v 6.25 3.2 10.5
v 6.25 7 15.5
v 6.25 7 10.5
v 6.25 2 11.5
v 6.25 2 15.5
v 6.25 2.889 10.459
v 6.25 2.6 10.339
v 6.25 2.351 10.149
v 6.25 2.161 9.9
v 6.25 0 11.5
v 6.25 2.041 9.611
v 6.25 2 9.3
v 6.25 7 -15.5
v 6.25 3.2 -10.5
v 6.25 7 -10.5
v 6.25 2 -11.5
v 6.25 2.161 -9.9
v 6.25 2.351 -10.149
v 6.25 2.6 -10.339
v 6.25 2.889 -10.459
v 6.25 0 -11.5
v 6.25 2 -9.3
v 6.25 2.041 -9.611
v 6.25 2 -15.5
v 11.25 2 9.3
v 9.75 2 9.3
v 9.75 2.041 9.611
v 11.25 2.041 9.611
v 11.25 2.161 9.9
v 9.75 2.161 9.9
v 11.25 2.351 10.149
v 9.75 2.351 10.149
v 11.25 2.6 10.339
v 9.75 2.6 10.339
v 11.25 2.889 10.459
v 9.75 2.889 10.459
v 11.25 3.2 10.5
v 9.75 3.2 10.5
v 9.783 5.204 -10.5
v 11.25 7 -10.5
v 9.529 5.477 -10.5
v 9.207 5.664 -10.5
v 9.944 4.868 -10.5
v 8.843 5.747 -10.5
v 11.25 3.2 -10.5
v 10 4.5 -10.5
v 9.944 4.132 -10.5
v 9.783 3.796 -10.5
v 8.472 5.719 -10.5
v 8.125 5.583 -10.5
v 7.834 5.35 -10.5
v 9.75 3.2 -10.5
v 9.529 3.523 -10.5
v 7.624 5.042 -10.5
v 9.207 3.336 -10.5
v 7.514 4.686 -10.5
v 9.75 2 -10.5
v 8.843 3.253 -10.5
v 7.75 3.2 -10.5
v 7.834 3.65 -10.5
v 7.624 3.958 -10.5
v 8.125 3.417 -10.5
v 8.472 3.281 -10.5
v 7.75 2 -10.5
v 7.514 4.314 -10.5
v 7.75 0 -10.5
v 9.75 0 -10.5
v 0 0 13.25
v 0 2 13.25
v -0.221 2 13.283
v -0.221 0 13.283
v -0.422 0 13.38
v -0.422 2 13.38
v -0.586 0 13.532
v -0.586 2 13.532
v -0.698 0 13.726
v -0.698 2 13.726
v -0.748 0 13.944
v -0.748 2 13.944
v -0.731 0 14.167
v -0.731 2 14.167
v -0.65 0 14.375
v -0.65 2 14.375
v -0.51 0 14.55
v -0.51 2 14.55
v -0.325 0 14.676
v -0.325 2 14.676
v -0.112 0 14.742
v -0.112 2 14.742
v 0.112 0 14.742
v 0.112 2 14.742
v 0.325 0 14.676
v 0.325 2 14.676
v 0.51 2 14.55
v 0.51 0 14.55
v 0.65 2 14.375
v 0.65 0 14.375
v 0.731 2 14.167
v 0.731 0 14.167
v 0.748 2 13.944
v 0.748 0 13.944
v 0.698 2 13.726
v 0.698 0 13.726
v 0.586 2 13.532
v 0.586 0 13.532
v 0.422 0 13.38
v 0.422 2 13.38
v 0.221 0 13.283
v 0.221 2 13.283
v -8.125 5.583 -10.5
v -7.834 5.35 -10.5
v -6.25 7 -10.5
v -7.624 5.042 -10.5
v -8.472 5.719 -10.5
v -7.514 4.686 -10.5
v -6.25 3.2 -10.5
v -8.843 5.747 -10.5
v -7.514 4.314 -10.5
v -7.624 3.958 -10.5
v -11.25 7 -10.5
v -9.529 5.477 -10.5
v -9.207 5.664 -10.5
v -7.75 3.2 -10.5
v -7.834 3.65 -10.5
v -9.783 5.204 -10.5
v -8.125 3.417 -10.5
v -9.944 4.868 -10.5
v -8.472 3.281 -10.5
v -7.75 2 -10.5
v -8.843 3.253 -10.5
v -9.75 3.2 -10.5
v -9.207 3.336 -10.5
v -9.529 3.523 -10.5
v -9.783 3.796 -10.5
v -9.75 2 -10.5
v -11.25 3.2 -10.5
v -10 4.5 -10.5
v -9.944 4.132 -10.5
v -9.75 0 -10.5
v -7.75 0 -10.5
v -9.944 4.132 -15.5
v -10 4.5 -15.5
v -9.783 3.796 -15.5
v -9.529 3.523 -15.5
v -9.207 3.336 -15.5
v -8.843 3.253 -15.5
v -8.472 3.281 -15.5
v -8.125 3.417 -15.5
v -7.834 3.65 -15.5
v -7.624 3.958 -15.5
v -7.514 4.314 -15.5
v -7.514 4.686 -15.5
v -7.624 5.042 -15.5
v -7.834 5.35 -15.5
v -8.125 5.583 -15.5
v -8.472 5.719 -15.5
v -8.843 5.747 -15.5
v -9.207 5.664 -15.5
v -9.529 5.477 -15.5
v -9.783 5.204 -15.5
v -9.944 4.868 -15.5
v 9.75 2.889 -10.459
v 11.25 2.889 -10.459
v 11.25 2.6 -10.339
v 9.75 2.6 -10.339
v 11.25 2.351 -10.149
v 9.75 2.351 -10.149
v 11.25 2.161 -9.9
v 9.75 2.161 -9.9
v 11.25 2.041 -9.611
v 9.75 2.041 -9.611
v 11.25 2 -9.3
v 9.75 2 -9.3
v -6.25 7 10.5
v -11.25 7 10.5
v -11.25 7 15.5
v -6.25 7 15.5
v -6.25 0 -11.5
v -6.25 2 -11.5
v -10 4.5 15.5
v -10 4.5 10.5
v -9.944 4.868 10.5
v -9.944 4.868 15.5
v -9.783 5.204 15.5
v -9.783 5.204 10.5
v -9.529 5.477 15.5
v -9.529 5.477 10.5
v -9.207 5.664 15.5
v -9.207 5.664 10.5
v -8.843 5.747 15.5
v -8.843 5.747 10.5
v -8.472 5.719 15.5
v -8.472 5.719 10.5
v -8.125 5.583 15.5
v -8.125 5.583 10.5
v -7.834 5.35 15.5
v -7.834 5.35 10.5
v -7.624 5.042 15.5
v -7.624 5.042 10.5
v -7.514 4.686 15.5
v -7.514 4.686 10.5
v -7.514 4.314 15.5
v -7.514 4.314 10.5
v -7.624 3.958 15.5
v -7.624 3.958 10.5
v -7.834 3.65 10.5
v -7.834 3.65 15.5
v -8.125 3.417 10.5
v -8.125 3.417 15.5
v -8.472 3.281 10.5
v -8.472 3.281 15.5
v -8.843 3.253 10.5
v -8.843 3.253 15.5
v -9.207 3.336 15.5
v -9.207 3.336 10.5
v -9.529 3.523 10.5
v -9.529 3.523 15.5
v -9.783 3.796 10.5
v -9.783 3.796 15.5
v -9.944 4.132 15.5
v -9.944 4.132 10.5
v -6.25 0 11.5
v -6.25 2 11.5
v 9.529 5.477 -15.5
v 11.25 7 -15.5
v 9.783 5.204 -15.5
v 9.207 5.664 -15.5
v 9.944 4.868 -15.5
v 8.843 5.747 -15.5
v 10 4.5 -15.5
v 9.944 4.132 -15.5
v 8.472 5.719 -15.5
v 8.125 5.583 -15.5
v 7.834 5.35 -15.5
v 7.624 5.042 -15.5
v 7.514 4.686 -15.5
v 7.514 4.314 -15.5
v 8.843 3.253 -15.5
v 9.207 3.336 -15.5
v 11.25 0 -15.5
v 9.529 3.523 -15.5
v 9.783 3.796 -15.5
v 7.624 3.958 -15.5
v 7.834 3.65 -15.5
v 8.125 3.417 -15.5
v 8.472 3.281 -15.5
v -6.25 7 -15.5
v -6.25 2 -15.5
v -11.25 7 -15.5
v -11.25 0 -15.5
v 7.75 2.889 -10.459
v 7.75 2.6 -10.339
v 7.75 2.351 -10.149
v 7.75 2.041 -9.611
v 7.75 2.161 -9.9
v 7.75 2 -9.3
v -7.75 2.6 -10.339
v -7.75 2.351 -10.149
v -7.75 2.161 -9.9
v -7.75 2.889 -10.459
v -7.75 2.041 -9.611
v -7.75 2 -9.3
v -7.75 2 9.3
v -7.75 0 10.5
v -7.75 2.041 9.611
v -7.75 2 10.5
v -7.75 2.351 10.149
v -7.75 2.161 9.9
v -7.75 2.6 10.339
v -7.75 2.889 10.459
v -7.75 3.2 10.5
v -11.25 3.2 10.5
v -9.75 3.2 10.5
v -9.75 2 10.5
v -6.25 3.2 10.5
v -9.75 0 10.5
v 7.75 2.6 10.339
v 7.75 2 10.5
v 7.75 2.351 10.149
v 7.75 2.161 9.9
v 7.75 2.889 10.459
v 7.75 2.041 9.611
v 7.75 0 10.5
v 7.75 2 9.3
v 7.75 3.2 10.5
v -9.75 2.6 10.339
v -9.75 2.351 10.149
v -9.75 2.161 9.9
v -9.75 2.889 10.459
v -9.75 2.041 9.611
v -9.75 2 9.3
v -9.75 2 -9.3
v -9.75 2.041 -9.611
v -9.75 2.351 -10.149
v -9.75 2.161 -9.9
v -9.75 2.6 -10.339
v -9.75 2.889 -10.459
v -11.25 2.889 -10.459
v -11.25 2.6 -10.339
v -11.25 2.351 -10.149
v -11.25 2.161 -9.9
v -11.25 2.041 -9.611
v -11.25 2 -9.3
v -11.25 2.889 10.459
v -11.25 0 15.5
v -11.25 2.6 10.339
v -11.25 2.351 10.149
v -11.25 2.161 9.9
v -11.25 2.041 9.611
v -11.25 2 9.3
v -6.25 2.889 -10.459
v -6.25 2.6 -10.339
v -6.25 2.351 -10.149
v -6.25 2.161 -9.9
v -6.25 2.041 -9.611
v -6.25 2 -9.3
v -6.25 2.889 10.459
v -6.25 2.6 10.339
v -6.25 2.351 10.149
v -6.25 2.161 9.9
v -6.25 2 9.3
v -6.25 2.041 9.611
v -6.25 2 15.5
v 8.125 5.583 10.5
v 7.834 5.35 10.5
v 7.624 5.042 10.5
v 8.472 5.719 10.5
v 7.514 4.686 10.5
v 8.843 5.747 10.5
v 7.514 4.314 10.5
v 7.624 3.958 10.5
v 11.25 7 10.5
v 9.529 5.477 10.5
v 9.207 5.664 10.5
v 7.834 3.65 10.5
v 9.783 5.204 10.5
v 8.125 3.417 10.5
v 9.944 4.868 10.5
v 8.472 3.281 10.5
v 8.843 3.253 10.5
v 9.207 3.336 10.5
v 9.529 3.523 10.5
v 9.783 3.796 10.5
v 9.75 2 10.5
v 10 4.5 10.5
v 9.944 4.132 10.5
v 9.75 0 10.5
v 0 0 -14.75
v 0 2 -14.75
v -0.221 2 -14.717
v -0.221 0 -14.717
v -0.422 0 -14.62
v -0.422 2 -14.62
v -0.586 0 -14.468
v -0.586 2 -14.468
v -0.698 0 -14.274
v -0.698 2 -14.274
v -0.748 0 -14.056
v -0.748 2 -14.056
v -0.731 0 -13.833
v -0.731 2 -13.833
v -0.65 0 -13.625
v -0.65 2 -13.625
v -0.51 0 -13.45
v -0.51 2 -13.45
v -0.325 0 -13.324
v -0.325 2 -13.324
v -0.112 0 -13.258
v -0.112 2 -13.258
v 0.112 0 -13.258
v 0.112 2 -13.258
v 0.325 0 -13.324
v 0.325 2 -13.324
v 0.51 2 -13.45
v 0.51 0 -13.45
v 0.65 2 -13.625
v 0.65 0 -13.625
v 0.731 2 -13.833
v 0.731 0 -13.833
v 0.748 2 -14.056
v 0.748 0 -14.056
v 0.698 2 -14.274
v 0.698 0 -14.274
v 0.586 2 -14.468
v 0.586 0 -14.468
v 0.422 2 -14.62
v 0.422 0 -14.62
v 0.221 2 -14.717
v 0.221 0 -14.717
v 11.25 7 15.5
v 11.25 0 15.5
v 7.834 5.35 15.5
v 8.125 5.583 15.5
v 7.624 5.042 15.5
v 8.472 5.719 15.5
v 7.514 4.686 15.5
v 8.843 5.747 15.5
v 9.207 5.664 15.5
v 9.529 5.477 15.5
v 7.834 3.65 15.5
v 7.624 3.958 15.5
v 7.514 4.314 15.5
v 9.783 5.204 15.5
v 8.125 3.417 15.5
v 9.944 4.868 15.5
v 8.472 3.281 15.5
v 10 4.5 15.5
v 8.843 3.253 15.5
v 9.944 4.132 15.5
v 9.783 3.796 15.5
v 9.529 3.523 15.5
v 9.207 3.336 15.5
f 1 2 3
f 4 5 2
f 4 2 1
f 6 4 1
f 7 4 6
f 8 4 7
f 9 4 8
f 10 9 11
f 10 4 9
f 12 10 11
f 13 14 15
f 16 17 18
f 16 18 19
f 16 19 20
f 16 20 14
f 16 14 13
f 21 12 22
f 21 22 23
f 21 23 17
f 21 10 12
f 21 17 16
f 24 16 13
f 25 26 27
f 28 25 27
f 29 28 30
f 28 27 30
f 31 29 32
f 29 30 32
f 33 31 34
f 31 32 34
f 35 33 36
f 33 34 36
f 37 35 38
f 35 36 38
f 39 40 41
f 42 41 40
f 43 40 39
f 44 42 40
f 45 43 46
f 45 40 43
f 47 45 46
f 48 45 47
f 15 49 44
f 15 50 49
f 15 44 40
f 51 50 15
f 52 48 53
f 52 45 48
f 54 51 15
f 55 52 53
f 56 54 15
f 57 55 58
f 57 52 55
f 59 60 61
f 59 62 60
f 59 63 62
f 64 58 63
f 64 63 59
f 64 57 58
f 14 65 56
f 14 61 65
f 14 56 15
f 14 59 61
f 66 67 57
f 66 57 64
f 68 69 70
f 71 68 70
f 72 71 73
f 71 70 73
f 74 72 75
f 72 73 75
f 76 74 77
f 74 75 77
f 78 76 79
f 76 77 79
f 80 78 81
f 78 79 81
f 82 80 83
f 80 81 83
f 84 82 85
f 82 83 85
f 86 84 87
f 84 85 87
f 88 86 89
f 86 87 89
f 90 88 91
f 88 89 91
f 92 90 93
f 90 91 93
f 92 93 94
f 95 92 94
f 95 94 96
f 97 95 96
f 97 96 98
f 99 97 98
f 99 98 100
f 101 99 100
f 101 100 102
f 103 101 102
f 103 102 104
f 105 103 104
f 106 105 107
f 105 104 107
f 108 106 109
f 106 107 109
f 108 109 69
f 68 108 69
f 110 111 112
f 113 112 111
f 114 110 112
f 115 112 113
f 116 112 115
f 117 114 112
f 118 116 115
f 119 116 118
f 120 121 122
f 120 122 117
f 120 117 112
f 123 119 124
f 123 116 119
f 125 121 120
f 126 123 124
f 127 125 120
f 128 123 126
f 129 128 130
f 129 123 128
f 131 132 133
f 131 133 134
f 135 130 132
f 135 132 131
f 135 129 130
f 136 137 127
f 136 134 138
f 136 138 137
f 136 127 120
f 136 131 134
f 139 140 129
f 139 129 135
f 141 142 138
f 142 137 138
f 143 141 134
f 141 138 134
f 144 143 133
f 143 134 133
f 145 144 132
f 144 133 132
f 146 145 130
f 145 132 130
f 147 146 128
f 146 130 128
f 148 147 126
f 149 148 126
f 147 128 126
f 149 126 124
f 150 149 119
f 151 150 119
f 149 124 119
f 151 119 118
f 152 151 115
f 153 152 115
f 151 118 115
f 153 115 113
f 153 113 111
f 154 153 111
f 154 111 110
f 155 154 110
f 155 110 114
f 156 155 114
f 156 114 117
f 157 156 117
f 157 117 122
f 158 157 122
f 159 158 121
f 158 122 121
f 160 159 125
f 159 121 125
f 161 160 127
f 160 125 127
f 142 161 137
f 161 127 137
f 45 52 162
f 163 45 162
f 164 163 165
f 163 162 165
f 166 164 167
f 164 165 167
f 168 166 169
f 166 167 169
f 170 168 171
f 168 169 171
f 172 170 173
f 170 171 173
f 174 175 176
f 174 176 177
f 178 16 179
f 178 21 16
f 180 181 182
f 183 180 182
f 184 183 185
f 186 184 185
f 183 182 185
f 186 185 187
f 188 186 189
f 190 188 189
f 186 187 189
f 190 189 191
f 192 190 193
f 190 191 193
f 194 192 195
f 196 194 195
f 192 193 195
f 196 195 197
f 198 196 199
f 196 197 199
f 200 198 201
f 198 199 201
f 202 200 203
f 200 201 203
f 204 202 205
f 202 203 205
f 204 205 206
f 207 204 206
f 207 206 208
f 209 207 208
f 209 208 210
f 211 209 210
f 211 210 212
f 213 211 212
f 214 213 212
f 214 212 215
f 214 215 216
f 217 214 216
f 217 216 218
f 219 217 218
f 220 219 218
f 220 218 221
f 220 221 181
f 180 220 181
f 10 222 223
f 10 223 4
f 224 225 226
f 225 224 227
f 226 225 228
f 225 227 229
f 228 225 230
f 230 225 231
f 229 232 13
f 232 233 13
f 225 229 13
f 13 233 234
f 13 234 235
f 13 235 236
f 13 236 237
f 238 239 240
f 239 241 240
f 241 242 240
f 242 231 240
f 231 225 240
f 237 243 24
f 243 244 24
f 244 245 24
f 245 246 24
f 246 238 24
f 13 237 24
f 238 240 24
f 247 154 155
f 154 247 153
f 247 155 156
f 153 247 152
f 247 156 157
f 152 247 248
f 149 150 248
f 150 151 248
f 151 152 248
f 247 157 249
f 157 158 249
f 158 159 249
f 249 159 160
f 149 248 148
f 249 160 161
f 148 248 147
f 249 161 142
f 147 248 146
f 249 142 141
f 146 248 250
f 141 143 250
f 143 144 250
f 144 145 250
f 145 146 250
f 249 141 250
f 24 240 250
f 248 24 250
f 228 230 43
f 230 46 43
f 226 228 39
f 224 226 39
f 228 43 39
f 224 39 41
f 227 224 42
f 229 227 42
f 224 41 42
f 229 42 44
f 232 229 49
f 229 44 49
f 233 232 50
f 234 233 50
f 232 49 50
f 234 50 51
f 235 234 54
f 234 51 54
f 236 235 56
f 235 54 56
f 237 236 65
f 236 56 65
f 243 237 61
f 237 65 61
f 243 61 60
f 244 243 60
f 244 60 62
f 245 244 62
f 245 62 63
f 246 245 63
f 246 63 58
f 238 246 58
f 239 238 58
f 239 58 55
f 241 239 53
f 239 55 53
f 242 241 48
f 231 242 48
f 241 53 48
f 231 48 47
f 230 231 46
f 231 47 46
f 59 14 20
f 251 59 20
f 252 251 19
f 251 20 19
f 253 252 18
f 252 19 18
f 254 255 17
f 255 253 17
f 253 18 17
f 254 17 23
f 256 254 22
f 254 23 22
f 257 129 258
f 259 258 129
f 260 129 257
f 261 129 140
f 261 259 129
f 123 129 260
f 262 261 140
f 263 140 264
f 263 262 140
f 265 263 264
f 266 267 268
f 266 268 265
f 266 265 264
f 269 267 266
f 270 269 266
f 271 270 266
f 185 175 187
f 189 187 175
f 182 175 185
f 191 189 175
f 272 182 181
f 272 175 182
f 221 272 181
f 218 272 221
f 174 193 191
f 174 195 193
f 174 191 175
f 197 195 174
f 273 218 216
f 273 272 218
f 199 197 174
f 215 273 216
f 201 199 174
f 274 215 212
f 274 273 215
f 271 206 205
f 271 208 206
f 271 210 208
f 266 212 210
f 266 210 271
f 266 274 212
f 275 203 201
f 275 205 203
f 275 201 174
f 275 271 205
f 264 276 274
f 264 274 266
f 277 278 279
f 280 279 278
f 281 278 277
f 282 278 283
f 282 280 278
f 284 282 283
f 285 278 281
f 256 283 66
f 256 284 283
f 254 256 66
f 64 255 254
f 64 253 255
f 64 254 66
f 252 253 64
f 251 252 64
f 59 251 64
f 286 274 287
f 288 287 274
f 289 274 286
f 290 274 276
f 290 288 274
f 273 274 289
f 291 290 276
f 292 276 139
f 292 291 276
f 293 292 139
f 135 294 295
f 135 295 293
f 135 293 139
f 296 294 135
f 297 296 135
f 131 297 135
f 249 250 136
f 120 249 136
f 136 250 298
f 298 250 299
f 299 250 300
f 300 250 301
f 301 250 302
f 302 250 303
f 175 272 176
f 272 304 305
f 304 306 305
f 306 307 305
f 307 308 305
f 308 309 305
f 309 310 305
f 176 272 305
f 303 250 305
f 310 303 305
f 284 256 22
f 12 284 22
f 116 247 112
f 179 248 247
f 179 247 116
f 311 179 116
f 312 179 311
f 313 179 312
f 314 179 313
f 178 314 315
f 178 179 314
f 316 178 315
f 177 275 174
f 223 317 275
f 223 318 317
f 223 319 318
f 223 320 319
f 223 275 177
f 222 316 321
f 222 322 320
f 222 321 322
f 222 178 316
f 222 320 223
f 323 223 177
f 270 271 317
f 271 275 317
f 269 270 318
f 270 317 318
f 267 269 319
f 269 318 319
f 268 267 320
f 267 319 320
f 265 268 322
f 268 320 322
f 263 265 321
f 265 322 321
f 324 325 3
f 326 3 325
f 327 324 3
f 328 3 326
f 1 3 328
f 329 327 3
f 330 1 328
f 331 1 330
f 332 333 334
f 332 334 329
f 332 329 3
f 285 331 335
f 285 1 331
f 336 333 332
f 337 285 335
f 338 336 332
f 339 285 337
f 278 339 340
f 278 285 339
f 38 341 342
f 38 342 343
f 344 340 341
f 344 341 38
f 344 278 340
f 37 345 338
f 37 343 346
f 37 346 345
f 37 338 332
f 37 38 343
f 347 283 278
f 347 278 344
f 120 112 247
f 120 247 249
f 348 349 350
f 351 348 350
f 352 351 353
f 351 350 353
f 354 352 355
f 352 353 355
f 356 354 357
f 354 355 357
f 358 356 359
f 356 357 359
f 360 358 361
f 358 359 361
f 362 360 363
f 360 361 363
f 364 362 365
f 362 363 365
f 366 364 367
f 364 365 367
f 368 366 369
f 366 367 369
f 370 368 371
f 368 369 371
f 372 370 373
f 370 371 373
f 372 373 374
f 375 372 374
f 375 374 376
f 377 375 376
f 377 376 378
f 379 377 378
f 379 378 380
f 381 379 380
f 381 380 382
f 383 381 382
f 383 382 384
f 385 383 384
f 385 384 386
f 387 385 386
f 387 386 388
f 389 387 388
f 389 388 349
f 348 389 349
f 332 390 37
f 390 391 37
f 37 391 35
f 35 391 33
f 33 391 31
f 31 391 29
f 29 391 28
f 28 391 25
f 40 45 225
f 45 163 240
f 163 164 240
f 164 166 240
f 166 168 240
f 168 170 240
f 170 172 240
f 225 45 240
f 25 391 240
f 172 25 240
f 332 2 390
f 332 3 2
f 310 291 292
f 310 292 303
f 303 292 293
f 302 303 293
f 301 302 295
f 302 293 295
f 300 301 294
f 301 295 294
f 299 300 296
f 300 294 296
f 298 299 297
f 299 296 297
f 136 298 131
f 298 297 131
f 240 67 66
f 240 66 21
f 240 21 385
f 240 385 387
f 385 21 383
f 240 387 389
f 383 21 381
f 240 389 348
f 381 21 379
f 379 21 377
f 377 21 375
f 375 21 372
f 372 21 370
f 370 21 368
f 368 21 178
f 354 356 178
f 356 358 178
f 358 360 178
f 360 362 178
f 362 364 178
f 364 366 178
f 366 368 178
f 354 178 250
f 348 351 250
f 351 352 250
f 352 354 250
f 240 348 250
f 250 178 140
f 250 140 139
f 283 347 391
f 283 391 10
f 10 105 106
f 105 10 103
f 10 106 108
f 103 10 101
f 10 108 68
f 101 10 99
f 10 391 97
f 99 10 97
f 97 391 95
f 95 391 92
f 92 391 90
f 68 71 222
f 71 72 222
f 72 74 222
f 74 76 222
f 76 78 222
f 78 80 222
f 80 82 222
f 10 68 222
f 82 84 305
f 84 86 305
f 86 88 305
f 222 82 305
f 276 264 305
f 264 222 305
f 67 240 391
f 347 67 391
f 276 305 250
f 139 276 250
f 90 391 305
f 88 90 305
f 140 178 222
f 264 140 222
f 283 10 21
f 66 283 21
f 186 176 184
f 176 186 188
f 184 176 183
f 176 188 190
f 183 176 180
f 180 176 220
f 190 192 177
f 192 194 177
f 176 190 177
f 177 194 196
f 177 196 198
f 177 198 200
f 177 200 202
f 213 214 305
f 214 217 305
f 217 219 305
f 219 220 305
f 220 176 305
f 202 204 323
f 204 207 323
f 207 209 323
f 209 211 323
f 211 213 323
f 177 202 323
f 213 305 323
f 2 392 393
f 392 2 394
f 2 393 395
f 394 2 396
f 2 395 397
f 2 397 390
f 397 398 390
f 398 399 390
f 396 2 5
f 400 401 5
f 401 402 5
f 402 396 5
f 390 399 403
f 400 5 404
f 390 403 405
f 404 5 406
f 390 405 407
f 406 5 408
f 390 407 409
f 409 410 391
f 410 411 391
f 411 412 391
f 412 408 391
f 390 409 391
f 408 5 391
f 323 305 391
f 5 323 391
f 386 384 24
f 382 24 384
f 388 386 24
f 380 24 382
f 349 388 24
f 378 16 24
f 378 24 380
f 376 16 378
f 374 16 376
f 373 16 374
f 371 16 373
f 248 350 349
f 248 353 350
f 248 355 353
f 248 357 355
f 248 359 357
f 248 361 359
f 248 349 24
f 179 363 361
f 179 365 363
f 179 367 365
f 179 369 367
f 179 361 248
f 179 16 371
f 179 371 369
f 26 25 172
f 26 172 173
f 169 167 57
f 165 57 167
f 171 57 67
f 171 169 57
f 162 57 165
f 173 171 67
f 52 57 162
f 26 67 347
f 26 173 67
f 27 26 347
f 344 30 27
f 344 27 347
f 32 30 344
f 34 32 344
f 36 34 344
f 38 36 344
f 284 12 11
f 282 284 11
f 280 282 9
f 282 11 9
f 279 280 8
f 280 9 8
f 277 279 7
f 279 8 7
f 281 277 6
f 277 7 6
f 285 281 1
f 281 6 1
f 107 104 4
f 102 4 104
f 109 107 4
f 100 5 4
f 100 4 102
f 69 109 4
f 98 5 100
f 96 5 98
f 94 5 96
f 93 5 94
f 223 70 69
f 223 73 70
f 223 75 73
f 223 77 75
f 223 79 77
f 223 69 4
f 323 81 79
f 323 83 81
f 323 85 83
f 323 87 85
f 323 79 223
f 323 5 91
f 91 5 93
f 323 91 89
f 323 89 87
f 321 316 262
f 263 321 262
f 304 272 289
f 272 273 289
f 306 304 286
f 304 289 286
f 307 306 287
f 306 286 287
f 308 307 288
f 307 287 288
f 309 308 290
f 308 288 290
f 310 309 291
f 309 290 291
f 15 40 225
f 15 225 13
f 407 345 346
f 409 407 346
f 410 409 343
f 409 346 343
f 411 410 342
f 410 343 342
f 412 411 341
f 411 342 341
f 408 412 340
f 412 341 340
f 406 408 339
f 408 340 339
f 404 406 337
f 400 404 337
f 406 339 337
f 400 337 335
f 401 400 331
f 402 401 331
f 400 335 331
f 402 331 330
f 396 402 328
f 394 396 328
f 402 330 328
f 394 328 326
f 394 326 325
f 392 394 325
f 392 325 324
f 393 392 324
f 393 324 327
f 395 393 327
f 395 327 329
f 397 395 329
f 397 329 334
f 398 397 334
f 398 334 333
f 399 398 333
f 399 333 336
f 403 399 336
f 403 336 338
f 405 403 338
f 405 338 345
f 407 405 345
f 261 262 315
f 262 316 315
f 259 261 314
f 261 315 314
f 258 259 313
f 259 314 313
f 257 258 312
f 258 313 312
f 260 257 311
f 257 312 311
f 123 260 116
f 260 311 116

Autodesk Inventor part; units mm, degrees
ref_plane "YZ Plane" through (0, 0, 0) normal (1, 0, 0) x (0, 1, 0)
sketch "スケッチ1" plane through (0, 0, 0) normal (0, 1, 0) x (-1, 0, 0)
  line L0 (6.25, 11.5) -> (-6.25, 11.5)
  line L1 (-6.25, 11.5) -> (-6.25, -11.5)
  line L2 (-6.25, -11.5) -> (6.25, -11.5)
  line L3 (6.25, -11.5) -> (6.25, 11.5)
  line L4 (6.25, -11.5) -> (-6.25, 11.5) construction
  line L5 (6.25, 11.5) -> (-6.25, -11.5) construction
  line L6 (11.25, 11.5) -> (11.25, -11.5)
  line L7 (-11.25, 11.5) -> (-11.25, -11.5)
  line L8 (0, 4) -> (0, -4) construction
  line L9 (0, 14) -> (0, -14) construction
  line L10 (11.25, -11.5) -> (11.25, -15.5)
  line L11 (11.25, -15.5) -> (-11.25, -15.5)
  line L12 (-11.25, -15.5) -> (-11.25, -11.5)
  line L13 (-11.25, 11.5) -> (-11.25, 15.5)
  line L14 (-11.25, 15.5) -> (11.25, 15.5)
  line L15 (11.25, 15.5) -> (11.25, 11.5)
  point P0 (0, 0)
  point P1 (0, 0)
  point P2 (0, 0)
  point P3 (0, -14)
  dimension "d0" = 23
  dimension "d1" = 12.5
  dimension "d2" = 5
  dimension "d3" = 28
  dimension "d4" = 8
  dimension "d21" = 4
  dimension "d26" = 5
  dimension "d27" = 4
extrude "押し出し1" add sketch "スケッチ1" along normal blind 2
hole "穴1" at (0, 0, 4) at (0, 0, -4) at (0, 0, 14) at (0, 0, -14) direction (0, 1, 0) diameter 1.5 end through all
sketch "スケッチ2" plane through (0, 2, 0) normal (0, 1, 0) x (1, 0, 0)
  line L0 (-6.25, -11.5) -> (-6.25, 11.5) projected
  circle A0 centre (0, -14) radius 0.75 projected
  circle A1 centre (0, 14) radius 0.75 projected
  line L1 (-11.25, 15.5) -> (-11.25, -15.5) projected
  line L2 (11.25, -15.5) -> (11.25, 15.5) projected
  line L3 (11.25, 15.5) -> (-11.25, 15.5) projected
  line L4 (-11.25, -15.5) -> (11.25, -15.5) projected
  line L5 (-11.25, 15.5) -> (-11.25, -15.5) projected
  line L6 (-11.25, -15.5) -> (11.25, -15.5) projected
  line L7 (-6.25, -15.5) -> (-11.25, -15.5)
  line L8 (-11.25, -15.5) -> (-11.25, -10.5)
  line L9 (-11.25, -10.5) -> (-6.25, -10.5)
  line L10 (-6.25, -10.5) -> (-6.25, -15.5)
  line L11 (6.25, -11.5) -> (-6.25, -11.5) projected
  line L12 (-6.25, -11.5) -> (-6.25, 11.5) projected
  line L13 (-6.25, 11.5) -> (6.25, 11.5) projected
  line L14 (6.25, 11.5) -> (6.25, -11.5) projected
  point P0 (0, 0)
  point P1 (-6.25, -10.5)
  dimension "d28" = 5
extrude "押し出し2" add sketch "スケッチ2" along normal blind 5 contours L10 L4 L1 L9 L0
sketch "スケッチ6" plane through (-6.25, 2, 10.5) normal (0, 0, -1) x (-1, 0, 0)
  line L0 (5, 0) -> (0, 5) construction
  line L1 (5, 5) -> (0, 0) construction
  circle A0 centre (2.5, 2.5) radius 1.25
  point P0 (-6.25, -2)
  dimension "d29" = 2.5
extrude "押し出し5" cut sketch "スケッチ6" along normal through all both and the other way through all
mirror "ミラー4" about plane through (0, 0, 0) normal (0, 0, 1) of "押し出し2", "押し出し5"
sketch "スケッチ7" plane through (0, 2, 0) normal (0, 1, 0) x (1, 0, 0)
  line L0 (-6.25, 10.5) -> (-11.25, 10.5) projected
  line L1 (-11.25, -10.5) -> (-6.25, -10.5) projected
  line L2 (-6.25, -10.5) -> (-11.25, 10.5) construction
  line L3 (-6.25, 10.5) -> (-11.25, -10.5) construction
  line L4 (-7.75, -10.5) -> (-9.75, -10.5)
  line L5 (-9.75, -10.5) -> (-9.75, 10.5)
  line L6 (-9.75, 10.5) -> (-7.75, 10.5)
  line L7 (-7.75, 10.5) -> (-7.75, -10.5)
  line L8 (-7.75, -10.5) -> (-9.75, 10.5) construction
  point P0 (0, 0)
  point P1 (-8.75, 0)
  dimension "d32" = 2
extrude "押し出し6" cut sketch "スケッチ7" against normal through all
mirror "ミラー5" about plane through (0, 0, 0) normal (1, 0, 0) of "押し出し2", "押し出し5", "ミラー4", "押し出し6"
fillet "フィレット1" radius 1.2 8 edges at (-10.5, 2, -10.5) (-7, 2, -10.5) (7, 2, -10.5) (10.5, 2, -10.5) (-10.5, 2, 10.5) (-7, 2, 10.5) (7, 2, 10.5) (10.5, 2, 10.5)
ref_plane "作業平面1" through (8.75, 0, 15.5) normal (1, 0, 0) x (0, 0, -1)
ref_plane "作業平面2" through (-8.75, 0, 11.5) normal (1, 0, 0) x (0, 0, -1)
equation "\"d26\" = d2"
equation "\"d27\" = d21"
properties part number "om_DropBase_8g" material "ABS プラスチック"
